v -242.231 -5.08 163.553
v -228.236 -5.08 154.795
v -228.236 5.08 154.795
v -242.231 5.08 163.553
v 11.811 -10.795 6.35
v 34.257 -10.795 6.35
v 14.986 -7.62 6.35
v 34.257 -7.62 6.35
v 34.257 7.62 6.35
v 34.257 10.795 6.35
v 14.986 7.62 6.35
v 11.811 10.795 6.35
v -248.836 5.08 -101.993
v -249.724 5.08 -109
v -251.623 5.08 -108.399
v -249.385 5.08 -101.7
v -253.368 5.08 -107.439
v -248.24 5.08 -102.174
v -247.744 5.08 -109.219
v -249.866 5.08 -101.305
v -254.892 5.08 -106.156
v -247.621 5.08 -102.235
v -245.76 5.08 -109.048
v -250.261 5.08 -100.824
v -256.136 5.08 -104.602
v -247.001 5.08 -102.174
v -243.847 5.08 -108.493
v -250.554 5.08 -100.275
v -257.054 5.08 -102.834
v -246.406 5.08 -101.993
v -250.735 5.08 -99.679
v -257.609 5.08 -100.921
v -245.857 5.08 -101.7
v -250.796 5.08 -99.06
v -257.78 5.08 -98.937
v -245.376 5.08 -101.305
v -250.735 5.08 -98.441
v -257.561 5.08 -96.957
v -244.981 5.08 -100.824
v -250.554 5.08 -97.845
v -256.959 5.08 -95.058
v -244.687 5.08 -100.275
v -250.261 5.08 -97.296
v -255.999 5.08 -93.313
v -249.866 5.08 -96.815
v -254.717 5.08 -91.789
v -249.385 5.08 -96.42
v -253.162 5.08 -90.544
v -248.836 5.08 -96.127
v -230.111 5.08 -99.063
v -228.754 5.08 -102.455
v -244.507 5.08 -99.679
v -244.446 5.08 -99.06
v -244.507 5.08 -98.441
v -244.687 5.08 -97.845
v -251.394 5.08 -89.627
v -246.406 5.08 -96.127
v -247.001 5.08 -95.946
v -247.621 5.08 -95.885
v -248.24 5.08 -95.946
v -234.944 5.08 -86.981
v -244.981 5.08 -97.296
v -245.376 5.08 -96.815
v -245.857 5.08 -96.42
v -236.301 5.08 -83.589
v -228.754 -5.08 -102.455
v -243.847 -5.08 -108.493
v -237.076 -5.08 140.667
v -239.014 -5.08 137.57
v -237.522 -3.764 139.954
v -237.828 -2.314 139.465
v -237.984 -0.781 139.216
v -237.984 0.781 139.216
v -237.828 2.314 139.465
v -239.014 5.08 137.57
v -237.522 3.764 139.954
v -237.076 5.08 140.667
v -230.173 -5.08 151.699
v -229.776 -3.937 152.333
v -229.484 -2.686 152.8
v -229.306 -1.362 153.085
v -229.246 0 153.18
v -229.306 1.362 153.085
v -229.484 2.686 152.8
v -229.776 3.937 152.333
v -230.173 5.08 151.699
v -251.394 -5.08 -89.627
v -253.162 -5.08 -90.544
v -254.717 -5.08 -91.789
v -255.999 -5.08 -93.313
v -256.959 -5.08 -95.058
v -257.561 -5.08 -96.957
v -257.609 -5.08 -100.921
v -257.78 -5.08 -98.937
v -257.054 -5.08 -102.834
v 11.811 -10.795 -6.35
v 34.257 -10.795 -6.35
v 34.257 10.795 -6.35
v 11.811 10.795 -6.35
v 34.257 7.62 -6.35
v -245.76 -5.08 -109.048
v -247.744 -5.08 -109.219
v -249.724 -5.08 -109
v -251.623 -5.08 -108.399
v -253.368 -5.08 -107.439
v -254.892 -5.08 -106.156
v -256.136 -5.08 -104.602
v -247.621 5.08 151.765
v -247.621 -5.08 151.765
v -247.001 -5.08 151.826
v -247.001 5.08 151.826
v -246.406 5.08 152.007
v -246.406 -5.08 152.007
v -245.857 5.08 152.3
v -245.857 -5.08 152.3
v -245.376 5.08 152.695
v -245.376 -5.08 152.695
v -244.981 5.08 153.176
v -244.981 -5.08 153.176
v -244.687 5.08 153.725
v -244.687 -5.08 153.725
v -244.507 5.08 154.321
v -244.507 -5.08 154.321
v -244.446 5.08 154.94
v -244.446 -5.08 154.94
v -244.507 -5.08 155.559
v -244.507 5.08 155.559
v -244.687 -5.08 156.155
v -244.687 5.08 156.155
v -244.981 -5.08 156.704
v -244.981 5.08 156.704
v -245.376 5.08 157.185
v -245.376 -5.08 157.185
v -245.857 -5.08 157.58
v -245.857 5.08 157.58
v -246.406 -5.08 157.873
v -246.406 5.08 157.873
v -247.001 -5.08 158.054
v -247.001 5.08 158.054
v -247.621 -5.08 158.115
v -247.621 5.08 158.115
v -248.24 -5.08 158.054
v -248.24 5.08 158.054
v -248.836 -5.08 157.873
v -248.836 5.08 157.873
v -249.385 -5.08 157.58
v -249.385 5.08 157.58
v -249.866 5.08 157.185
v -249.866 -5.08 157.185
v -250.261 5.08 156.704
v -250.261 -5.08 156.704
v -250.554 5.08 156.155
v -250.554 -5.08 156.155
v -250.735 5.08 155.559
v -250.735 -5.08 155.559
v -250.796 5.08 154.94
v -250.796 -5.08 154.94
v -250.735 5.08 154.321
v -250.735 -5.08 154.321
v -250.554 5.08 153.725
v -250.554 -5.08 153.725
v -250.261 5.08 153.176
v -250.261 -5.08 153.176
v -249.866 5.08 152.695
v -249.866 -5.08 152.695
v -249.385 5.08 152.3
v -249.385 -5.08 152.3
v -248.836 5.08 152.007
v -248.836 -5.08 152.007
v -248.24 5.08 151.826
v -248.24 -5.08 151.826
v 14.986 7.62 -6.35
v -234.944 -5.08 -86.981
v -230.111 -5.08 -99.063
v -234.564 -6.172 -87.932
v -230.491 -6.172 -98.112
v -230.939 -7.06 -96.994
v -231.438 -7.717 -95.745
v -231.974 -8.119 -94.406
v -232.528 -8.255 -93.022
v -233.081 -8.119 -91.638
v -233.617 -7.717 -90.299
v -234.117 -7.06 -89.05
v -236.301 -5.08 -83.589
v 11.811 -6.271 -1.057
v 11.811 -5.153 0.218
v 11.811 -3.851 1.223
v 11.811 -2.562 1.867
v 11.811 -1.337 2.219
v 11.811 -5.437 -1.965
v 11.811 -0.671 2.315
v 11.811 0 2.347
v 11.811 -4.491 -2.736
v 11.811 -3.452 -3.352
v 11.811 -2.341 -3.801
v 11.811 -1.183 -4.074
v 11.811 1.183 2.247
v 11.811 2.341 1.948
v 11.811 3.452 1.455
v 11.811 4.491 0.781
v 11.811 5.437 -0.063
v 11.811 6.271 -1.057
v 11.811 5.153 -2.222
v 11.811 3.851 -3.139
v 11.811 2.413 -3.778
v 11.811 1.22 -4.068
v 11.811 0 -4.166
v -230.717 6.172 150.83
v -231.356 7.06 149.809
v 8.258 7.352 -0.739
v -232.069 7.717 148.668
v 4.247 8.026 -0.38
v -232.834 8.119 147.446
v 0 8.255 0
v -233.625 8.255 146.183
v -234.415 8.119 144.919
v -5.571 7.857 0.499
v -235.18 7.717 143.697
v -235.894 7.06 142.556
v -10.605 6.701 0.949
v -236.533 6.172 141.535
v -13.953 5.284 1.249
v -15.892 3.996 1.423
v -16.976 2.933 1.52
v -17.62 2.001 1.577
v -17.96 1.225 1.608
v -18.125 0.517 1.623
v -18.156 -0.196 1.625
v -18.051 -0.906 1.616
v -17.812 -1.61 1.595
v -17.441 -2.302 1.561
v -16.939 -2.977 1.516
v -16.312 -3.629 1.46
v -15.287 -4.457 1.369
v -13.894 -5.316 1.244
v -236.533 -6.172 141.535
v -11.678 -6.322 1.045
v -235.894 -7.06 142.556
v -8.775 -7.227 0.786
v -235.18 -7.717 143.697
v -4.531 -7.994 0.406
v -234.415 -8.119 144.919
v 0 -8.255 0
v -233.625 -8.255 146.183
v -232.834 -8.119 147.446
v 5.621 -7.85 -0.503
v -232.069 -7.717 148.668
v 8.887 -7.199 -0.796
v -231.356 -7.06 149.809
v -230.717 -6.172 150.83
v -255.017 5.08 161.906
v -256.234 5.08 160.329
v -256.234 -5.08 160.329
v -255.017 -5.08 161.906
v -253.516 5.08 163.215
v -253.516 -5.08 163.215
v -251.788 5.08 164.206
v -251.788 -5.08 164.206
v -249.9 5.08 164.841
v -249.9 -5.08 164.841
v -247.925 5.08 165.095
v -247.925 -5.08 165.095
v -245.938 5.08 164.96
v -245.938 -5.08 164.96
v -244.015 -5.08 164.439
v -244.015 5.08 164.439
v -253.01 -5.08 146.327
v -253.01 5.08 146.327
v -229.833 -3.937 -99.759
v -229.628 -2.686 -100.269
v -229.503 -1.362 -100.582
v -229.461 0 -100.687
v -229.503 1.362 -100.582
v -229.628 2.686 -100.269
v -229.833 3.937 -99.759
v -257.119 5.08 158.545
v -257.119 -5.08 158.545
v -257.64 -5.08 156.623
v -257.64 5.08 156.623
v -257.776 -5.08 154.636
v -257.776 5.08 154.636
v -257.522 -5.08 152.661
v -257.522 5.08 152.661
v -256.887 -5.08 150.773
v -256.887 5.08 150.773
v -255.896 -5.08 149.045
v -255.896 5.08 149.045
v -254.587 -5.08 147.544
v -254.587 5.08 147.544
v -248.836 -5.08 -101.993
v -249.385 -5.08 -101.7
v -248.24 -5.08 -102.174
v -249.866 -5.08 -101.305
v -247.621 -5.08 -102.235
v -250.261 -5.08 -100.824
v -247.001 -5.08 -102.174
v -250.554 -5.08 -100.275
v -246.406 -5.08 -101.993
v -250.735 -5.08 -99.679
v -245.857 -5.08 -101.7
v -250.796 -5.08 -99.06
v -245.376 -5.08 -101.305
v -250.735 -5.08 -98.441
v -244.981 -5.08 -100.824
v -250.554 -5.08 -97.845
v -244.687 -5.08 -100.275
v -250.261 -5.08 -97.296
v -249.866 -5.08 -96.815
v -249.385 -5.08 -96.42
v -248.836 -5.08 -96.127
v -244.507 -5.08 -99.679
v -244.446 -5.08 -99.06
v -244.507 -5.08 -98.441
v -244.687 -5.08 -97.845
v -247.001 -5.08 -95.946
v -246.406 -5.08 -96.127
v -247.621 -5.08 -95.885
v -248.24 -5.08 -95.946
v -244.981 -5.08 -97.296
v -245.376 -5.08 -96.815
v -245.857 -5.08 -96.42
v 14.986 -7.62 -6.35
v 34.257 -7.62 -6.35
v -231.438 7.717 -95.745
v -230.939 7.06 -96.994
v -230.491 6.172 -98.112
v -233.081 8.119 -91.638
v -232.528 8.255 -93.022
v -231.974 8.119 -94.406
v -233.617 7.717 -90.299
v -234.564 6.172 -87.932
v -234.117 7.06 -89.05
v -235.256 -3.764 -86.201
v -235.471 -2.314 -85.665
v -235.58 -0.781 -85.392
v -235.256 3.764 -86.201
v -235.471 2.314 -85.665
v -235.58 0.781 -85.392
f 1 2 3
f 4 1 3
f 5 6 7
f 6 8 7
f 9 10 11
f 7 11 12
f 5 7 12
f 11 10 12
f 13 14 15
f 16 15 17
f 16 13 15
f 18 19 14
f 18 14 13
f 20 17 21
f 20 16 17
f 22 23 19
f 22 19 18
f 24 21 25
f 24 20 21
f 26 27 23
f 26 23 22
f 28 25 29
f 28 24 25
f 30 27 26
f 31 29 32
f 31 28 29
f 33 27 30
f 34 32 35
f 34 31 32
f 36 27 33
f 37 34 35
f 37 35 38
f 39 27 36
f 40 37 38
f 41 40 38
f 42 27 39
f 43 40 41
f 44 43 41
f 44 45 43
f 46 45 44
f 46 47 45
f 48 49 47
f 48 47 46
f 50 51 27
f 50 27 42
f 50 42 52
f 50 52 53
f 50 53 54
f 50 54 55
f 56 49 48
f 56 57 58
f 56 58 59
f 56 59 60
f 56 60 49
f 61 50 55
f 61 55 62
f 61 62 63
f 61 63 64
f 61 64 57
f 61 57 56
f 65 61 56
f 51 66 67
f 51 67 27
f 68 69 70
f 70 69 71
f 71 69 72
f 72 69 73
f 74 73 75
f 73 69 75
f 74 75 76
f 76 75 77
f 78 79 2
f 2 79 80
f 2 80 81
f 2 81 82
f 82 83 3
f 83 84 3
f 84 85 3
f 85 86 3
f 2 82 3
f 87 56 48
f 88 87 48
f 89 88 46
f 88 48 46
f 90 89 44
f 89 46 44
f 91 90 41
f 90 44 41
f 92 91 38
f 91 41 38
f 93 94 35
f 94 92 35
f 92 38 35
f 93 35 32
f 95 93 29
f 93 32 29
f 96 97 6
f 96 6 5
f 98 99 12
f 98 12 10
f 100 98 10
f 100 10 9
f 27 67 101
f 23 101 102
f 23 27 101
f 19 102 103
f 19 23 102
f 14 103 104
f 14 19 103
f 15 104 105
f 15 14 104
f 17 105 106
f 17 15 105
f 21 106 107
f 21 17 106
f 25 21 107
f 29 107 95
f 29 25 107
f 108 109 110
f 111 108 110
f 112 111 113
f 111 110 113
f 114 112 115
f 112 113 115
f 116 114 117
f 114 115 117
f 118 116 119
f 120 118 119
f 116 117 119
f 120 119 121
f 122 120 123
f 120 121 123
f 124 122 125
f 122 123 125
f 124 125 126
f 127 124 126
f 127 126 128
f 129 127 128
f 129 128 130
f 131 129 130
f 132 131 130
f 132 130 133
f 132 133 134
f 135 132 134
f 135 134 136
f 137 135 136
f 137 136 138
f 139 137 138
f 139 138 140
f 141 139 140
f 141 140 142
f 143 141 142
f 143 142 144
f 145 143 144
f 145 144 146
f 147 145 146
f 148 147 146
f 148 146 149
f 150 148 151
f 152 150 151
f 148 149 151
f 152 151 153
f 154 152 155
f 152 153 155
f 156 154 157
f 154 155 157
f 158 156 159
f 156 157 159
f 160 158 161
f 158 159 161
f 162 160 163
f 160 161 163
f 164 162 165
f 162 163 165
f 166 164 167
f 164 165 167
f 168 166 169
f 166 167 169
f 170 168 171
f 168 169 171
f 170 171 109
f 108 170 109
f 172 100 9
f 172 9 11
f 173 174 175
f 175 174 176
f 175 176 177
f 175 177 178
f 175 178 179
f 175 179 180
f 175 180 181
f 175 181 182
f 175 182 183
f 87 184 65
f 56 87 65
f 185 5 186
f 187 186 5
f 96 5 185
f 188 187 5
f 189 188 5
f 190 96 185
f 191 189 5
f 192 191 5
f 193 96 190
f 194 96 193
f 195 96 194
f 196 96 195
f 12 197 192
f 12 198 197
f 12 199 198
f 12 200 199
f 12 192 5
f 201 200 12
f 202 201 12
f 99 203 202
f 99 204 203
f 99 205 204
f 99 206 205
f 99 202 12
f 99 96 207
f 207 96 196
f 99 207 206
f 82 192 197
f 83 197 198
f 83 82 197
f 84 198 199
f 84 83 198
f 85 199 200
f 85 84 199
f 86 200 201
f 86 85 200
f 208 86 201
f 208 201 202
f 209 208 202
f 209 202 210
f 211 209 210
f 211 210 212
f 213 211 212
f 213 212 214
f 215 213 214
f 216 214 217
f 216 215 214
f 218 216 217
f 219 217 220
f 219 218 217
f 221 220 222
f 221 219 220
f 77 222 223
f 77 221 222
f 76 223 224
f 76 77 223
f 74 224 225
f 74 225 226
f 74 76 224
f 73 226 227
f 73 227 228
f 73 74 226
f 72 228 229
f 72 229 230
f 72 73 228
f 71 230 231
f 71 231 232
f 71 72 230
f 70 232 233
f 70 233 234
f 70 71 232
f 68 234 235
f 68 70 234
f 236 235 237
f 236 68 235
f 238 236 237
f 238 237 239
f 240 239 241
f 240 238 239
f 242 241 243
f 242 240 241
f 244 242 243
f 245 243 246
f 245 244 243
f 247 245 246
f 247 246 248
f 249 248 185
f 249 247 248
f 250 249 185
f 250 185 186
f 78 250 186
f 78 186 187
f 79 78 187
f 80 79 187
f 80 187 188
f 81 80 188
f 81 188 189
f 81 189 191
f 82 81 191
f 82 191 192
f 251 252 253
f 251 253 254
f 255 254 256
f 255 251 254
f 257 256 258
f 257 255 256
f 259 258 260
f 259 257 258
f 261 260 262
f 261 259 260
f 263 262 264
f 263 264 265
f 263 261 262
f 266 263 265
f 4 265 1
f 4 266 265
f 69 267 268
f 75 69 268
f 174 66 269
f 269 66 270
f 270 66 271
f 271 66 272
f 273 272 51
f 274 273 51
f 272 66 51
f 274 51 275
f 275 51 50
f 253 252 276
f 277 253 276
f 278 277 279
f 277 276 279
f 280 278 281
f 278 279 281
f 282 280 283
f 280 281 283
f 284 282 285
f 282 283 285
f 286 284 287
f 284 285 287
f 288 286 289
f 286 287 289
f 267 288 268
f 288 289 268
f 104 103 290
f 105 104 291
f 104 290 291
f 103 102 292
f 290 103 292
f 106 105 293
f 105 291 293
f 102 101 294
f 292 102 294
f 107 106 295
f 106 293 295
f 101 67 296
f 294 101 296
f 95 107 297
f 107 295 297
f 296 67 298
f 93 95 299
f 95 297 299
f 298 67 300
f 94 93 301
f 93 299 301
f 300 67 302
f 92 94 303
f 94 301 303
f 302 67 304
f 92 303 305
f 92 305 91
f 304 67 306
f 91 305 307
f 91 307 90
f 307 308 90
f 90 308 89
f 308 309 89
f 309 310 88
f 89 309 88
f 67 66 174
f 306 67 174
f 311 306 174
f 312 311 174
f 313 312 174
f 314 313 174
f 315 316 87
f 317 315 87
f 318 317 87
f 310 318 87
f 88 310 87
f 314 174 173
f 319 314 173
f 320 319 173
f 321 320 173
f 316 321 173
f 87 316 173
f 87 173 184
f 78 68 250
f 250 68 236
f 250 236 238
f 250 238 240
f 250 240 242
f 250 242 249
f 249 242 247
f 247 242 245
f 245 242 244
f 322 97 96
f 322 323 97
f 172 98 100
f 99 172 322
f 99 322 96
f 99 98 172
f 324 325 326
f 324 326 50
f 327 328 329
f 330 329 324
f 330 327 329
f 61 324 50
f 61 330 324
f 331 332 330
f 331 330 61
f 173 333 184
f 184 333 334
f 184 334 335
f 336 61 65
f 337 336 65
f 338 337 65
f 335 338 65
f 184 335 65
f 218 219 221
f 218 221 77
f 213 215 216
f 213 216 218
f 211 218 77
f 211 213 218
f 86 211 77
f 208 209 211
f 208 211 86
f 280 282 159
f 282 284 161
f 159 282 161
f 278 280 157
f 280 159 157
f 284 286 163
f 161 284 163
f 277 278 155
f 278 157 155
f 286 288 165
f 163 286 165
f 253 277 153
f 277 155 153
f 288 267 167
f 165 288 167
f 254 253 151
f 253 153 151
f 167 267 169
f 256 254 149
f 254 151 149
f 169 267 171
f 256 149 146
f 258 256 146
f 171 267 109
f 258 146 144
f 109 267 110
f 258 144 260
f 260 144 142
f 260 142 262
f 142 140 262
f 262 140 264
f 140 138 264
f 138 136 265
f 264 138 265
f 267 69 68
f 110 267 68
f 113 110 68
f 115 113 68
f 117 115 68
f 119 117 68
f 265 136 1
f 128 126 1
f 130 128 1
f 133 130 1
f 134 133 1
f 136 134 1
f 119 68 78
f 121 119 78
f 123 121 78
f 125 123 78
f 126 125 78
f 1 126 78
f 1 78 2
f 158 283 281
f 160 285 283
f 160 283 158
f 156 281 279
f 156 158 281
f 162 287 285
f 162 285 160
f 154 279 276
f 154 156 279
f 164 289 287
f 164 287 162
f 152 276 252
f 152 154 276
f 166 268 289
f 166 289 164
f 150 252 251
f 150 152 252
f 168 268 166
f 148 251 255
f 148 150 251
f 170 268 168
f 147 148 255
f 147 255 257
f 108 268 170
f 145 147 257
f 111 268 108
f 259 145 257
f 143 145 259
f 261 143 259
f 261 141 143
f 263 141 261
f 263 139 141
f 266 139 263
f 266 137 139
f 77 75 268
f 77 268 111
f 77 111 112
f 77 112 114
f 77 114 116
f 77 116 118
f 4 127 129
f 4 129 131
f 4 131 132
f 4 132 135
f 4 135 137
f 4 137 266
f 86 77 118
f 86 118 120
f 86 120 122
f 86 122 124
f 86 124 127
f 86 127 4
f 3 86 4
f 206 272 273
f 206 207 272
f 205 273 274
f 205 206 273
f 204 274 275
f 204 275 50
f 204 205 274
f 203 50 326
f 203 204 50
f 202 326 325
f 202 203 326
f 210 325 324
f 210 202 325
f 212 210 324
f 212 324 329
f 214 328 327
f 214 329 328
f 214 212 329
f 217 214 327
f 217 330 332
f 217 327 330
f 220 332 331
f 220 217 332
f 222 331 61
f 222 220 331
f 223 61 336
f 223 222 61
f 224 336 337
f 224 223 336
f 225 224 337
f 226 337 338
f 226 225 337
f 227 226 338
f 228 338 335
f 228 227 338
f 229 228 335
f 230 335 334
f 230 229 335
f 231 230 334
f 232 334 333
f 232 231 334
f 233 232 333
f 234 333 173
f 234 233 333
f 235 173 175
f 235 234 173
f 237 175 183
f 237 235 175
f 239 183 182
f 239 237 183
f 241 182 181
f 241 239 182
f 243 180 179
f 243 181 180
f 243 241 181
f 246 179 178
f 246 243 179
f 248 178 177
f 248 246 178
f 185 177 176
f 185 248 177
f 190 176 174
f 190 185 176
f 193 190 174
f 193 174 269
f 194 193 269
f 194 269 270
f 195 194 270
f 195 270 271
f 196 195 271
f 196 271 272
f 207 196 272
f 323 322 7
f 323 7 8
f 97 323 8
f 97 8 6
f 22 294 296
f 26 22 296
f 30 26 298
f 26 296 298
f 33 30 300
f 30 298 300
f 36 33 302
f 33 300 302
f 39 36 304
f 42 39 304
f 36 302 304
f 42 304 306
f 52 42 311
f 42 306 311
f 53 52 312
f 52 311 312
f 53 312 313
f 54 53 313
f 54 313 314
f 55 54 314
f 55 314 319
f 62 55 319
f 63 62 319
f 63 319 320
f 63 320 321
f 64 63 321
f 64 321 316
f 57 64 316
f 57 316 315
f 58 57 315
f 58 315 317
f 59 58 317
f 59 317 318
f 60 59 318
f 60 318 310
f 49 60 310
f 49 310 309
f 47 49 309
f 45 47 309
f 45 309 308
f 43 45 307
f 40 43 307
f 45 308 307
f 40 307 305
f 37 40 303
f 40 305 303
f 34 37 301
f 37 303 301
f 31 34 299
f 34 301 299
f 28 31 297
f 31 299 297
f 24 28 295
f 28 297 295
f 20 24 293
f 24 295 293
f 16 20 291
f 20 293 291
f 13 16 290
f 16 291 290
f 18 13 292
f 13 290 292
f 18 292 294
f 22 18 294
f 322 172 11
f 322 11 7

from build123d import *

# Parameters (mm, degrees)
SKETCH2_R                   = 8.255
BOSS_EXTRUDE1_DEPTH         = 6.35
BOSS_EXTRUDE1_DEPTH_BACK    = 6.35
BOSS_EXTRUDE2_DEPTH         = 10.16
BOSS_EXTRUDE2_DEPTH_BACK    = 16.51
SKETCH4_W                   = 20.32
SKETCH4_H                   = 10.16
BOSS_EXTRUDE3_DEPTH         = 10.16
BOSS_EXTRUDE3_DEPTH_BACK    = 16.256
SKETCH5_W                   = 20.32
SKETCH5_H                   = 10.16
CUT_EXTRUDE1_DEPTH          = 312.833197041
CUT_EXTRUDE2_DEPTH          = 312.833197041
CUT_EXTRUDE3_DEPTH          = 16.51
CUT_EXTRUDE4_START          = -16.256
CUT_EXTRUDE4_DEPTH          = 16.256
CUT_EXTRUDE5_DEPTH          = 303.933951477
E_0_25_DIAMETER_HOLE1_D     = 6.35
E_0_25_DIAMETER_HOLE1_DEPTH = 19.05
E_0_25_DIAMETER_HOLE1_TIP   = 1.907732465


with BuildPart() as part:
    # Sweep1: sweep along a path in Sketch1
    with BuildLine(Plane(origin=(0, 0, 0), x_dir=(1, 0, 0), z_dir=(0, 1, 0))) as sweep1_path:
        Line((-247.620690573, 99.06), (0, 0))
        Line((0, 0), (-247.620690573, -154.94))
    # Sketch2 → Sweep1 (sweep)
    with BuildSketch(Plane(origin=(-247.620690573, 0, 154.94), x_dir=(0.5304347826086957, 0, 0.847725746570709), z_dir=(-0.8477257465707089, 0, 0.5304347826086956))):
        Circle(SKETCH2_R)
    sweep(path=sweep1_path.line, transition=Transition.RIGHT)

    # Sketch3 → Boss-Extrude1 (add, two sides: drawn at the far end of the back side and taken through both)
    with BuildSketch(Plane.XY.offset(-BOSS_EXTRUDE1_DEPTH_BACK)):
        Polygon((34.256672931, -10.795), (11.811, -10.795), (11.811, 10.795), (34.256672931, 10.795), (34.256672931, 7.62), (14.986, 7.62), (14.986, -7.62), (34.256672931, -7.62), align=None)
    extrude(amount=BOSS_EXTRUDE1_DEPTH + BOSS_EXTRUDE1_DEPTH_BACK)

    # Sketch4 → Boss-Extrude2 (add, two sides: drawn at the far end of the back side and taken through both)
    with BuildSketch(Plane(origin=(-247.620690573, 0, 154.94), x_dir=(0.5304347826086958, 0, 0.8477257465707089), z_dir=(-0.847725746570709, 0, 0.5304347826086958)).offset(-BOSS_EXTRUDE2_DEPTH_BACK)):
        Rectangle(SKETCH4_W, SKETCH4_H)
    extrude(amount=BOSS_EXTRUDE2_DEPTH + BOSS_EXTRUDE2_DEPTH_BACK)

    # Sketch5 → Boss-Extrude3 (add, two sides: drawn at the far end of the back side and taken through both)
    with BuildSketch(Plane(origin=(-247.620690573, 0, -99.06), x_dir=(-0.3714285714285716, 0, 0.9284615319583954), z_dir=(-0.9284615319583954, 0, -0.3714285714285716)).offset(-BOSS_EXTRUDE3_DEPTH_BACK)):
        Rectangle(SKETCH5_W, SKETCH5_H)
    extrude(amount=BOSS_EXTRUDE3_DEPTH + BOSS_EXTRUDE3_DEPTH_BACK)

    # Sketch7 → Cut-Extrude1 (cut, through all)
    with BuildSketch(Plane(origin=(0, 5.08, 0), x_dir=(1, 0, 0), z_dir=(0, 1, 0))):
        with BuildLine():
            Line((-257.053859738, 102.833714286), (-260.827574024, 93.400545121))
            Line((-260.827574024, 93.400545121), (-251.394404859, 89.626830835))
            ThreePointArc((-251.394404859, 89.626830835), (-256.959367419, 95.058161077), (-257.053859738, 102.833714286))
        make_face()
    cut_extrude1 = extrude(amount=-CUT_EXTRUDE1_DEPTH, mode=Mode.SUBTRACT)

    # Mirror1: Cut-Extrude1 across plane
    add(cut_extrude1.mirror(Plane(origin=(0, 0, 0), x_dir=(0.9284615319583953, 0, 0.3714285714285718), z_dir=(-0.3714285714285718, 0, 0.9284615319583954))), mode=Mode.SUBTRACT)

    # Sketch9 → Cut-Extrude2 (cut, through all)
    with BuildSketch(Plane(origin=(0, 5.08, 0), x_dir=(1, 0, 0), z_dir=(0, 1, 0))):
        with BuildLine():
            Line((-242.231473182, -163.552893585), (-250.844366767, -168.942110976))
            Line((-250.844366767, -168.942110976), (-256.233584158, -160.329217391))
            ThreePointArc((-256.233584158, -160.329217391), (-249.90017387, -164.840987622), (-242.231473182, -163.552893585))
        make_face()
    cut_extrude2 = extrude(amount=-CUT_EXTRUDE2_DEPTH, mode=Mode.SUBTRACT)

    # Mirror2: Cut-Extrude2 across plane
    add(cut_extrude2.mirror(Plane(origin=(0, 0, 0), x_dir=(-0.8477257465707089, 0, 0.5304347826086955), z_dir=(0.5304347826086959, 0, 0.8477257465707089))), mode=Mode.SUBTRACT)

    # Sketch10 → Cut-Extrude3 (cut)
    with BuildSketch(Plane(origin=(-247.620690573, 0, 154.94), x_dir=(0.5304347826086958, 0, 0.8477257465707089), z_dir=(-0.847725746570709, 0, 0.5304347826086958))):
        with BuildLine():
            Line((6.506813736, -5.08), (-6.506813736, -5.08))
            ThreePointArc((-6.506813736, -5.08), (0, -8.255), (6.506813736, -5.08))
        make_face()
        with BuildLine():
            Line((-6.506813736, 5.08), (6.506813736, 5.08))
            ThreePointArc((6.506813736, 5.08), (0, 8.255), (-6.506813736, 5.08))
        make_face()
    extrude(amount=-CUT_EXTRUDE3_DEPTH, mode=Mode.SUBTRACT)

    # Sketch11 → Cut-Extrude4 (cut)
    with BuildSketch(Plane(origin=(-247.620690573, 0, -99.06), x_dir=(-0.3714285714285716, 0, 0.9284615319583954), z_dir=(-0.9284615319583954, 0, -0.3714285714285716)).offset(CUT_EXTRUDE4_START)):
        with BuildLine():
            Line((6.506813736, -5.08), (-6.506813736, -5.08))
            ThreePointArc((-6.506813736, -5.08), (0, -8.255), (6.506813736, -5.08))
        make_face()
        with BuildLine():
            Line((-6.506813736, 5.08), (6.506813736, 5.08))
            ThreePointArc((6.506813736, 5.08), (0, 8.255), (-6.506813736, 5.08))
        make_face()
    extrude(amount=CUT_EXTRUDE4_DEPTH, mode=Mode.SUBTRACT)

    # Sketch12 → Cut-Extrude5 (cut, through all)
    with BuildSketch(Plane.XY.offset(6.35)):
        with BuildLine():
            Line((14.986, 4.663063163), (14.986, -4.663063163))
            add(Edge.make_bspline(
                [(14.986, -4.663063163), (22.008669492, 0), (14.986, 4.663063163)],
                knots=[5.682900603, 5.682900603, 5.682900603, 6.883470012, 6.883470012, 6.883470012], degree=2, weights=[1, 0.825174825, 1]))
        make_face()
    extrude(amount=-CUT_EXTRUDE5_DEPTH, mode=Mode.SUBTRACT)

    # E (0.25) Diameter Hole1
    with Locations(Plane(origin=(-247.620690573, 5.08, -99.06), x_dir=(0, 0, 1), z_dir=(0, 1, 0))):
        with Locations((0, 0), (254, 0)):
            Hole(E_0_25_DIAMETER_HOLE1_D / 2, depth=E_0_25_DIAMETER_HOLE1_DEPTH)
            with Locations((0, 0, -(E_0_25_DIAMETER_HOLE1_DEPTH + E_0_25_DIAMETER_HOLE1_TIP / 2))):  # 118° drill point
                Cone(0, E_0_25_DIAMETER_HOLE1_D / 2, E_0_25_DIAMETER_HOLE1_TIP, mode=Mode.SUBTRACT)


solid = part.part
